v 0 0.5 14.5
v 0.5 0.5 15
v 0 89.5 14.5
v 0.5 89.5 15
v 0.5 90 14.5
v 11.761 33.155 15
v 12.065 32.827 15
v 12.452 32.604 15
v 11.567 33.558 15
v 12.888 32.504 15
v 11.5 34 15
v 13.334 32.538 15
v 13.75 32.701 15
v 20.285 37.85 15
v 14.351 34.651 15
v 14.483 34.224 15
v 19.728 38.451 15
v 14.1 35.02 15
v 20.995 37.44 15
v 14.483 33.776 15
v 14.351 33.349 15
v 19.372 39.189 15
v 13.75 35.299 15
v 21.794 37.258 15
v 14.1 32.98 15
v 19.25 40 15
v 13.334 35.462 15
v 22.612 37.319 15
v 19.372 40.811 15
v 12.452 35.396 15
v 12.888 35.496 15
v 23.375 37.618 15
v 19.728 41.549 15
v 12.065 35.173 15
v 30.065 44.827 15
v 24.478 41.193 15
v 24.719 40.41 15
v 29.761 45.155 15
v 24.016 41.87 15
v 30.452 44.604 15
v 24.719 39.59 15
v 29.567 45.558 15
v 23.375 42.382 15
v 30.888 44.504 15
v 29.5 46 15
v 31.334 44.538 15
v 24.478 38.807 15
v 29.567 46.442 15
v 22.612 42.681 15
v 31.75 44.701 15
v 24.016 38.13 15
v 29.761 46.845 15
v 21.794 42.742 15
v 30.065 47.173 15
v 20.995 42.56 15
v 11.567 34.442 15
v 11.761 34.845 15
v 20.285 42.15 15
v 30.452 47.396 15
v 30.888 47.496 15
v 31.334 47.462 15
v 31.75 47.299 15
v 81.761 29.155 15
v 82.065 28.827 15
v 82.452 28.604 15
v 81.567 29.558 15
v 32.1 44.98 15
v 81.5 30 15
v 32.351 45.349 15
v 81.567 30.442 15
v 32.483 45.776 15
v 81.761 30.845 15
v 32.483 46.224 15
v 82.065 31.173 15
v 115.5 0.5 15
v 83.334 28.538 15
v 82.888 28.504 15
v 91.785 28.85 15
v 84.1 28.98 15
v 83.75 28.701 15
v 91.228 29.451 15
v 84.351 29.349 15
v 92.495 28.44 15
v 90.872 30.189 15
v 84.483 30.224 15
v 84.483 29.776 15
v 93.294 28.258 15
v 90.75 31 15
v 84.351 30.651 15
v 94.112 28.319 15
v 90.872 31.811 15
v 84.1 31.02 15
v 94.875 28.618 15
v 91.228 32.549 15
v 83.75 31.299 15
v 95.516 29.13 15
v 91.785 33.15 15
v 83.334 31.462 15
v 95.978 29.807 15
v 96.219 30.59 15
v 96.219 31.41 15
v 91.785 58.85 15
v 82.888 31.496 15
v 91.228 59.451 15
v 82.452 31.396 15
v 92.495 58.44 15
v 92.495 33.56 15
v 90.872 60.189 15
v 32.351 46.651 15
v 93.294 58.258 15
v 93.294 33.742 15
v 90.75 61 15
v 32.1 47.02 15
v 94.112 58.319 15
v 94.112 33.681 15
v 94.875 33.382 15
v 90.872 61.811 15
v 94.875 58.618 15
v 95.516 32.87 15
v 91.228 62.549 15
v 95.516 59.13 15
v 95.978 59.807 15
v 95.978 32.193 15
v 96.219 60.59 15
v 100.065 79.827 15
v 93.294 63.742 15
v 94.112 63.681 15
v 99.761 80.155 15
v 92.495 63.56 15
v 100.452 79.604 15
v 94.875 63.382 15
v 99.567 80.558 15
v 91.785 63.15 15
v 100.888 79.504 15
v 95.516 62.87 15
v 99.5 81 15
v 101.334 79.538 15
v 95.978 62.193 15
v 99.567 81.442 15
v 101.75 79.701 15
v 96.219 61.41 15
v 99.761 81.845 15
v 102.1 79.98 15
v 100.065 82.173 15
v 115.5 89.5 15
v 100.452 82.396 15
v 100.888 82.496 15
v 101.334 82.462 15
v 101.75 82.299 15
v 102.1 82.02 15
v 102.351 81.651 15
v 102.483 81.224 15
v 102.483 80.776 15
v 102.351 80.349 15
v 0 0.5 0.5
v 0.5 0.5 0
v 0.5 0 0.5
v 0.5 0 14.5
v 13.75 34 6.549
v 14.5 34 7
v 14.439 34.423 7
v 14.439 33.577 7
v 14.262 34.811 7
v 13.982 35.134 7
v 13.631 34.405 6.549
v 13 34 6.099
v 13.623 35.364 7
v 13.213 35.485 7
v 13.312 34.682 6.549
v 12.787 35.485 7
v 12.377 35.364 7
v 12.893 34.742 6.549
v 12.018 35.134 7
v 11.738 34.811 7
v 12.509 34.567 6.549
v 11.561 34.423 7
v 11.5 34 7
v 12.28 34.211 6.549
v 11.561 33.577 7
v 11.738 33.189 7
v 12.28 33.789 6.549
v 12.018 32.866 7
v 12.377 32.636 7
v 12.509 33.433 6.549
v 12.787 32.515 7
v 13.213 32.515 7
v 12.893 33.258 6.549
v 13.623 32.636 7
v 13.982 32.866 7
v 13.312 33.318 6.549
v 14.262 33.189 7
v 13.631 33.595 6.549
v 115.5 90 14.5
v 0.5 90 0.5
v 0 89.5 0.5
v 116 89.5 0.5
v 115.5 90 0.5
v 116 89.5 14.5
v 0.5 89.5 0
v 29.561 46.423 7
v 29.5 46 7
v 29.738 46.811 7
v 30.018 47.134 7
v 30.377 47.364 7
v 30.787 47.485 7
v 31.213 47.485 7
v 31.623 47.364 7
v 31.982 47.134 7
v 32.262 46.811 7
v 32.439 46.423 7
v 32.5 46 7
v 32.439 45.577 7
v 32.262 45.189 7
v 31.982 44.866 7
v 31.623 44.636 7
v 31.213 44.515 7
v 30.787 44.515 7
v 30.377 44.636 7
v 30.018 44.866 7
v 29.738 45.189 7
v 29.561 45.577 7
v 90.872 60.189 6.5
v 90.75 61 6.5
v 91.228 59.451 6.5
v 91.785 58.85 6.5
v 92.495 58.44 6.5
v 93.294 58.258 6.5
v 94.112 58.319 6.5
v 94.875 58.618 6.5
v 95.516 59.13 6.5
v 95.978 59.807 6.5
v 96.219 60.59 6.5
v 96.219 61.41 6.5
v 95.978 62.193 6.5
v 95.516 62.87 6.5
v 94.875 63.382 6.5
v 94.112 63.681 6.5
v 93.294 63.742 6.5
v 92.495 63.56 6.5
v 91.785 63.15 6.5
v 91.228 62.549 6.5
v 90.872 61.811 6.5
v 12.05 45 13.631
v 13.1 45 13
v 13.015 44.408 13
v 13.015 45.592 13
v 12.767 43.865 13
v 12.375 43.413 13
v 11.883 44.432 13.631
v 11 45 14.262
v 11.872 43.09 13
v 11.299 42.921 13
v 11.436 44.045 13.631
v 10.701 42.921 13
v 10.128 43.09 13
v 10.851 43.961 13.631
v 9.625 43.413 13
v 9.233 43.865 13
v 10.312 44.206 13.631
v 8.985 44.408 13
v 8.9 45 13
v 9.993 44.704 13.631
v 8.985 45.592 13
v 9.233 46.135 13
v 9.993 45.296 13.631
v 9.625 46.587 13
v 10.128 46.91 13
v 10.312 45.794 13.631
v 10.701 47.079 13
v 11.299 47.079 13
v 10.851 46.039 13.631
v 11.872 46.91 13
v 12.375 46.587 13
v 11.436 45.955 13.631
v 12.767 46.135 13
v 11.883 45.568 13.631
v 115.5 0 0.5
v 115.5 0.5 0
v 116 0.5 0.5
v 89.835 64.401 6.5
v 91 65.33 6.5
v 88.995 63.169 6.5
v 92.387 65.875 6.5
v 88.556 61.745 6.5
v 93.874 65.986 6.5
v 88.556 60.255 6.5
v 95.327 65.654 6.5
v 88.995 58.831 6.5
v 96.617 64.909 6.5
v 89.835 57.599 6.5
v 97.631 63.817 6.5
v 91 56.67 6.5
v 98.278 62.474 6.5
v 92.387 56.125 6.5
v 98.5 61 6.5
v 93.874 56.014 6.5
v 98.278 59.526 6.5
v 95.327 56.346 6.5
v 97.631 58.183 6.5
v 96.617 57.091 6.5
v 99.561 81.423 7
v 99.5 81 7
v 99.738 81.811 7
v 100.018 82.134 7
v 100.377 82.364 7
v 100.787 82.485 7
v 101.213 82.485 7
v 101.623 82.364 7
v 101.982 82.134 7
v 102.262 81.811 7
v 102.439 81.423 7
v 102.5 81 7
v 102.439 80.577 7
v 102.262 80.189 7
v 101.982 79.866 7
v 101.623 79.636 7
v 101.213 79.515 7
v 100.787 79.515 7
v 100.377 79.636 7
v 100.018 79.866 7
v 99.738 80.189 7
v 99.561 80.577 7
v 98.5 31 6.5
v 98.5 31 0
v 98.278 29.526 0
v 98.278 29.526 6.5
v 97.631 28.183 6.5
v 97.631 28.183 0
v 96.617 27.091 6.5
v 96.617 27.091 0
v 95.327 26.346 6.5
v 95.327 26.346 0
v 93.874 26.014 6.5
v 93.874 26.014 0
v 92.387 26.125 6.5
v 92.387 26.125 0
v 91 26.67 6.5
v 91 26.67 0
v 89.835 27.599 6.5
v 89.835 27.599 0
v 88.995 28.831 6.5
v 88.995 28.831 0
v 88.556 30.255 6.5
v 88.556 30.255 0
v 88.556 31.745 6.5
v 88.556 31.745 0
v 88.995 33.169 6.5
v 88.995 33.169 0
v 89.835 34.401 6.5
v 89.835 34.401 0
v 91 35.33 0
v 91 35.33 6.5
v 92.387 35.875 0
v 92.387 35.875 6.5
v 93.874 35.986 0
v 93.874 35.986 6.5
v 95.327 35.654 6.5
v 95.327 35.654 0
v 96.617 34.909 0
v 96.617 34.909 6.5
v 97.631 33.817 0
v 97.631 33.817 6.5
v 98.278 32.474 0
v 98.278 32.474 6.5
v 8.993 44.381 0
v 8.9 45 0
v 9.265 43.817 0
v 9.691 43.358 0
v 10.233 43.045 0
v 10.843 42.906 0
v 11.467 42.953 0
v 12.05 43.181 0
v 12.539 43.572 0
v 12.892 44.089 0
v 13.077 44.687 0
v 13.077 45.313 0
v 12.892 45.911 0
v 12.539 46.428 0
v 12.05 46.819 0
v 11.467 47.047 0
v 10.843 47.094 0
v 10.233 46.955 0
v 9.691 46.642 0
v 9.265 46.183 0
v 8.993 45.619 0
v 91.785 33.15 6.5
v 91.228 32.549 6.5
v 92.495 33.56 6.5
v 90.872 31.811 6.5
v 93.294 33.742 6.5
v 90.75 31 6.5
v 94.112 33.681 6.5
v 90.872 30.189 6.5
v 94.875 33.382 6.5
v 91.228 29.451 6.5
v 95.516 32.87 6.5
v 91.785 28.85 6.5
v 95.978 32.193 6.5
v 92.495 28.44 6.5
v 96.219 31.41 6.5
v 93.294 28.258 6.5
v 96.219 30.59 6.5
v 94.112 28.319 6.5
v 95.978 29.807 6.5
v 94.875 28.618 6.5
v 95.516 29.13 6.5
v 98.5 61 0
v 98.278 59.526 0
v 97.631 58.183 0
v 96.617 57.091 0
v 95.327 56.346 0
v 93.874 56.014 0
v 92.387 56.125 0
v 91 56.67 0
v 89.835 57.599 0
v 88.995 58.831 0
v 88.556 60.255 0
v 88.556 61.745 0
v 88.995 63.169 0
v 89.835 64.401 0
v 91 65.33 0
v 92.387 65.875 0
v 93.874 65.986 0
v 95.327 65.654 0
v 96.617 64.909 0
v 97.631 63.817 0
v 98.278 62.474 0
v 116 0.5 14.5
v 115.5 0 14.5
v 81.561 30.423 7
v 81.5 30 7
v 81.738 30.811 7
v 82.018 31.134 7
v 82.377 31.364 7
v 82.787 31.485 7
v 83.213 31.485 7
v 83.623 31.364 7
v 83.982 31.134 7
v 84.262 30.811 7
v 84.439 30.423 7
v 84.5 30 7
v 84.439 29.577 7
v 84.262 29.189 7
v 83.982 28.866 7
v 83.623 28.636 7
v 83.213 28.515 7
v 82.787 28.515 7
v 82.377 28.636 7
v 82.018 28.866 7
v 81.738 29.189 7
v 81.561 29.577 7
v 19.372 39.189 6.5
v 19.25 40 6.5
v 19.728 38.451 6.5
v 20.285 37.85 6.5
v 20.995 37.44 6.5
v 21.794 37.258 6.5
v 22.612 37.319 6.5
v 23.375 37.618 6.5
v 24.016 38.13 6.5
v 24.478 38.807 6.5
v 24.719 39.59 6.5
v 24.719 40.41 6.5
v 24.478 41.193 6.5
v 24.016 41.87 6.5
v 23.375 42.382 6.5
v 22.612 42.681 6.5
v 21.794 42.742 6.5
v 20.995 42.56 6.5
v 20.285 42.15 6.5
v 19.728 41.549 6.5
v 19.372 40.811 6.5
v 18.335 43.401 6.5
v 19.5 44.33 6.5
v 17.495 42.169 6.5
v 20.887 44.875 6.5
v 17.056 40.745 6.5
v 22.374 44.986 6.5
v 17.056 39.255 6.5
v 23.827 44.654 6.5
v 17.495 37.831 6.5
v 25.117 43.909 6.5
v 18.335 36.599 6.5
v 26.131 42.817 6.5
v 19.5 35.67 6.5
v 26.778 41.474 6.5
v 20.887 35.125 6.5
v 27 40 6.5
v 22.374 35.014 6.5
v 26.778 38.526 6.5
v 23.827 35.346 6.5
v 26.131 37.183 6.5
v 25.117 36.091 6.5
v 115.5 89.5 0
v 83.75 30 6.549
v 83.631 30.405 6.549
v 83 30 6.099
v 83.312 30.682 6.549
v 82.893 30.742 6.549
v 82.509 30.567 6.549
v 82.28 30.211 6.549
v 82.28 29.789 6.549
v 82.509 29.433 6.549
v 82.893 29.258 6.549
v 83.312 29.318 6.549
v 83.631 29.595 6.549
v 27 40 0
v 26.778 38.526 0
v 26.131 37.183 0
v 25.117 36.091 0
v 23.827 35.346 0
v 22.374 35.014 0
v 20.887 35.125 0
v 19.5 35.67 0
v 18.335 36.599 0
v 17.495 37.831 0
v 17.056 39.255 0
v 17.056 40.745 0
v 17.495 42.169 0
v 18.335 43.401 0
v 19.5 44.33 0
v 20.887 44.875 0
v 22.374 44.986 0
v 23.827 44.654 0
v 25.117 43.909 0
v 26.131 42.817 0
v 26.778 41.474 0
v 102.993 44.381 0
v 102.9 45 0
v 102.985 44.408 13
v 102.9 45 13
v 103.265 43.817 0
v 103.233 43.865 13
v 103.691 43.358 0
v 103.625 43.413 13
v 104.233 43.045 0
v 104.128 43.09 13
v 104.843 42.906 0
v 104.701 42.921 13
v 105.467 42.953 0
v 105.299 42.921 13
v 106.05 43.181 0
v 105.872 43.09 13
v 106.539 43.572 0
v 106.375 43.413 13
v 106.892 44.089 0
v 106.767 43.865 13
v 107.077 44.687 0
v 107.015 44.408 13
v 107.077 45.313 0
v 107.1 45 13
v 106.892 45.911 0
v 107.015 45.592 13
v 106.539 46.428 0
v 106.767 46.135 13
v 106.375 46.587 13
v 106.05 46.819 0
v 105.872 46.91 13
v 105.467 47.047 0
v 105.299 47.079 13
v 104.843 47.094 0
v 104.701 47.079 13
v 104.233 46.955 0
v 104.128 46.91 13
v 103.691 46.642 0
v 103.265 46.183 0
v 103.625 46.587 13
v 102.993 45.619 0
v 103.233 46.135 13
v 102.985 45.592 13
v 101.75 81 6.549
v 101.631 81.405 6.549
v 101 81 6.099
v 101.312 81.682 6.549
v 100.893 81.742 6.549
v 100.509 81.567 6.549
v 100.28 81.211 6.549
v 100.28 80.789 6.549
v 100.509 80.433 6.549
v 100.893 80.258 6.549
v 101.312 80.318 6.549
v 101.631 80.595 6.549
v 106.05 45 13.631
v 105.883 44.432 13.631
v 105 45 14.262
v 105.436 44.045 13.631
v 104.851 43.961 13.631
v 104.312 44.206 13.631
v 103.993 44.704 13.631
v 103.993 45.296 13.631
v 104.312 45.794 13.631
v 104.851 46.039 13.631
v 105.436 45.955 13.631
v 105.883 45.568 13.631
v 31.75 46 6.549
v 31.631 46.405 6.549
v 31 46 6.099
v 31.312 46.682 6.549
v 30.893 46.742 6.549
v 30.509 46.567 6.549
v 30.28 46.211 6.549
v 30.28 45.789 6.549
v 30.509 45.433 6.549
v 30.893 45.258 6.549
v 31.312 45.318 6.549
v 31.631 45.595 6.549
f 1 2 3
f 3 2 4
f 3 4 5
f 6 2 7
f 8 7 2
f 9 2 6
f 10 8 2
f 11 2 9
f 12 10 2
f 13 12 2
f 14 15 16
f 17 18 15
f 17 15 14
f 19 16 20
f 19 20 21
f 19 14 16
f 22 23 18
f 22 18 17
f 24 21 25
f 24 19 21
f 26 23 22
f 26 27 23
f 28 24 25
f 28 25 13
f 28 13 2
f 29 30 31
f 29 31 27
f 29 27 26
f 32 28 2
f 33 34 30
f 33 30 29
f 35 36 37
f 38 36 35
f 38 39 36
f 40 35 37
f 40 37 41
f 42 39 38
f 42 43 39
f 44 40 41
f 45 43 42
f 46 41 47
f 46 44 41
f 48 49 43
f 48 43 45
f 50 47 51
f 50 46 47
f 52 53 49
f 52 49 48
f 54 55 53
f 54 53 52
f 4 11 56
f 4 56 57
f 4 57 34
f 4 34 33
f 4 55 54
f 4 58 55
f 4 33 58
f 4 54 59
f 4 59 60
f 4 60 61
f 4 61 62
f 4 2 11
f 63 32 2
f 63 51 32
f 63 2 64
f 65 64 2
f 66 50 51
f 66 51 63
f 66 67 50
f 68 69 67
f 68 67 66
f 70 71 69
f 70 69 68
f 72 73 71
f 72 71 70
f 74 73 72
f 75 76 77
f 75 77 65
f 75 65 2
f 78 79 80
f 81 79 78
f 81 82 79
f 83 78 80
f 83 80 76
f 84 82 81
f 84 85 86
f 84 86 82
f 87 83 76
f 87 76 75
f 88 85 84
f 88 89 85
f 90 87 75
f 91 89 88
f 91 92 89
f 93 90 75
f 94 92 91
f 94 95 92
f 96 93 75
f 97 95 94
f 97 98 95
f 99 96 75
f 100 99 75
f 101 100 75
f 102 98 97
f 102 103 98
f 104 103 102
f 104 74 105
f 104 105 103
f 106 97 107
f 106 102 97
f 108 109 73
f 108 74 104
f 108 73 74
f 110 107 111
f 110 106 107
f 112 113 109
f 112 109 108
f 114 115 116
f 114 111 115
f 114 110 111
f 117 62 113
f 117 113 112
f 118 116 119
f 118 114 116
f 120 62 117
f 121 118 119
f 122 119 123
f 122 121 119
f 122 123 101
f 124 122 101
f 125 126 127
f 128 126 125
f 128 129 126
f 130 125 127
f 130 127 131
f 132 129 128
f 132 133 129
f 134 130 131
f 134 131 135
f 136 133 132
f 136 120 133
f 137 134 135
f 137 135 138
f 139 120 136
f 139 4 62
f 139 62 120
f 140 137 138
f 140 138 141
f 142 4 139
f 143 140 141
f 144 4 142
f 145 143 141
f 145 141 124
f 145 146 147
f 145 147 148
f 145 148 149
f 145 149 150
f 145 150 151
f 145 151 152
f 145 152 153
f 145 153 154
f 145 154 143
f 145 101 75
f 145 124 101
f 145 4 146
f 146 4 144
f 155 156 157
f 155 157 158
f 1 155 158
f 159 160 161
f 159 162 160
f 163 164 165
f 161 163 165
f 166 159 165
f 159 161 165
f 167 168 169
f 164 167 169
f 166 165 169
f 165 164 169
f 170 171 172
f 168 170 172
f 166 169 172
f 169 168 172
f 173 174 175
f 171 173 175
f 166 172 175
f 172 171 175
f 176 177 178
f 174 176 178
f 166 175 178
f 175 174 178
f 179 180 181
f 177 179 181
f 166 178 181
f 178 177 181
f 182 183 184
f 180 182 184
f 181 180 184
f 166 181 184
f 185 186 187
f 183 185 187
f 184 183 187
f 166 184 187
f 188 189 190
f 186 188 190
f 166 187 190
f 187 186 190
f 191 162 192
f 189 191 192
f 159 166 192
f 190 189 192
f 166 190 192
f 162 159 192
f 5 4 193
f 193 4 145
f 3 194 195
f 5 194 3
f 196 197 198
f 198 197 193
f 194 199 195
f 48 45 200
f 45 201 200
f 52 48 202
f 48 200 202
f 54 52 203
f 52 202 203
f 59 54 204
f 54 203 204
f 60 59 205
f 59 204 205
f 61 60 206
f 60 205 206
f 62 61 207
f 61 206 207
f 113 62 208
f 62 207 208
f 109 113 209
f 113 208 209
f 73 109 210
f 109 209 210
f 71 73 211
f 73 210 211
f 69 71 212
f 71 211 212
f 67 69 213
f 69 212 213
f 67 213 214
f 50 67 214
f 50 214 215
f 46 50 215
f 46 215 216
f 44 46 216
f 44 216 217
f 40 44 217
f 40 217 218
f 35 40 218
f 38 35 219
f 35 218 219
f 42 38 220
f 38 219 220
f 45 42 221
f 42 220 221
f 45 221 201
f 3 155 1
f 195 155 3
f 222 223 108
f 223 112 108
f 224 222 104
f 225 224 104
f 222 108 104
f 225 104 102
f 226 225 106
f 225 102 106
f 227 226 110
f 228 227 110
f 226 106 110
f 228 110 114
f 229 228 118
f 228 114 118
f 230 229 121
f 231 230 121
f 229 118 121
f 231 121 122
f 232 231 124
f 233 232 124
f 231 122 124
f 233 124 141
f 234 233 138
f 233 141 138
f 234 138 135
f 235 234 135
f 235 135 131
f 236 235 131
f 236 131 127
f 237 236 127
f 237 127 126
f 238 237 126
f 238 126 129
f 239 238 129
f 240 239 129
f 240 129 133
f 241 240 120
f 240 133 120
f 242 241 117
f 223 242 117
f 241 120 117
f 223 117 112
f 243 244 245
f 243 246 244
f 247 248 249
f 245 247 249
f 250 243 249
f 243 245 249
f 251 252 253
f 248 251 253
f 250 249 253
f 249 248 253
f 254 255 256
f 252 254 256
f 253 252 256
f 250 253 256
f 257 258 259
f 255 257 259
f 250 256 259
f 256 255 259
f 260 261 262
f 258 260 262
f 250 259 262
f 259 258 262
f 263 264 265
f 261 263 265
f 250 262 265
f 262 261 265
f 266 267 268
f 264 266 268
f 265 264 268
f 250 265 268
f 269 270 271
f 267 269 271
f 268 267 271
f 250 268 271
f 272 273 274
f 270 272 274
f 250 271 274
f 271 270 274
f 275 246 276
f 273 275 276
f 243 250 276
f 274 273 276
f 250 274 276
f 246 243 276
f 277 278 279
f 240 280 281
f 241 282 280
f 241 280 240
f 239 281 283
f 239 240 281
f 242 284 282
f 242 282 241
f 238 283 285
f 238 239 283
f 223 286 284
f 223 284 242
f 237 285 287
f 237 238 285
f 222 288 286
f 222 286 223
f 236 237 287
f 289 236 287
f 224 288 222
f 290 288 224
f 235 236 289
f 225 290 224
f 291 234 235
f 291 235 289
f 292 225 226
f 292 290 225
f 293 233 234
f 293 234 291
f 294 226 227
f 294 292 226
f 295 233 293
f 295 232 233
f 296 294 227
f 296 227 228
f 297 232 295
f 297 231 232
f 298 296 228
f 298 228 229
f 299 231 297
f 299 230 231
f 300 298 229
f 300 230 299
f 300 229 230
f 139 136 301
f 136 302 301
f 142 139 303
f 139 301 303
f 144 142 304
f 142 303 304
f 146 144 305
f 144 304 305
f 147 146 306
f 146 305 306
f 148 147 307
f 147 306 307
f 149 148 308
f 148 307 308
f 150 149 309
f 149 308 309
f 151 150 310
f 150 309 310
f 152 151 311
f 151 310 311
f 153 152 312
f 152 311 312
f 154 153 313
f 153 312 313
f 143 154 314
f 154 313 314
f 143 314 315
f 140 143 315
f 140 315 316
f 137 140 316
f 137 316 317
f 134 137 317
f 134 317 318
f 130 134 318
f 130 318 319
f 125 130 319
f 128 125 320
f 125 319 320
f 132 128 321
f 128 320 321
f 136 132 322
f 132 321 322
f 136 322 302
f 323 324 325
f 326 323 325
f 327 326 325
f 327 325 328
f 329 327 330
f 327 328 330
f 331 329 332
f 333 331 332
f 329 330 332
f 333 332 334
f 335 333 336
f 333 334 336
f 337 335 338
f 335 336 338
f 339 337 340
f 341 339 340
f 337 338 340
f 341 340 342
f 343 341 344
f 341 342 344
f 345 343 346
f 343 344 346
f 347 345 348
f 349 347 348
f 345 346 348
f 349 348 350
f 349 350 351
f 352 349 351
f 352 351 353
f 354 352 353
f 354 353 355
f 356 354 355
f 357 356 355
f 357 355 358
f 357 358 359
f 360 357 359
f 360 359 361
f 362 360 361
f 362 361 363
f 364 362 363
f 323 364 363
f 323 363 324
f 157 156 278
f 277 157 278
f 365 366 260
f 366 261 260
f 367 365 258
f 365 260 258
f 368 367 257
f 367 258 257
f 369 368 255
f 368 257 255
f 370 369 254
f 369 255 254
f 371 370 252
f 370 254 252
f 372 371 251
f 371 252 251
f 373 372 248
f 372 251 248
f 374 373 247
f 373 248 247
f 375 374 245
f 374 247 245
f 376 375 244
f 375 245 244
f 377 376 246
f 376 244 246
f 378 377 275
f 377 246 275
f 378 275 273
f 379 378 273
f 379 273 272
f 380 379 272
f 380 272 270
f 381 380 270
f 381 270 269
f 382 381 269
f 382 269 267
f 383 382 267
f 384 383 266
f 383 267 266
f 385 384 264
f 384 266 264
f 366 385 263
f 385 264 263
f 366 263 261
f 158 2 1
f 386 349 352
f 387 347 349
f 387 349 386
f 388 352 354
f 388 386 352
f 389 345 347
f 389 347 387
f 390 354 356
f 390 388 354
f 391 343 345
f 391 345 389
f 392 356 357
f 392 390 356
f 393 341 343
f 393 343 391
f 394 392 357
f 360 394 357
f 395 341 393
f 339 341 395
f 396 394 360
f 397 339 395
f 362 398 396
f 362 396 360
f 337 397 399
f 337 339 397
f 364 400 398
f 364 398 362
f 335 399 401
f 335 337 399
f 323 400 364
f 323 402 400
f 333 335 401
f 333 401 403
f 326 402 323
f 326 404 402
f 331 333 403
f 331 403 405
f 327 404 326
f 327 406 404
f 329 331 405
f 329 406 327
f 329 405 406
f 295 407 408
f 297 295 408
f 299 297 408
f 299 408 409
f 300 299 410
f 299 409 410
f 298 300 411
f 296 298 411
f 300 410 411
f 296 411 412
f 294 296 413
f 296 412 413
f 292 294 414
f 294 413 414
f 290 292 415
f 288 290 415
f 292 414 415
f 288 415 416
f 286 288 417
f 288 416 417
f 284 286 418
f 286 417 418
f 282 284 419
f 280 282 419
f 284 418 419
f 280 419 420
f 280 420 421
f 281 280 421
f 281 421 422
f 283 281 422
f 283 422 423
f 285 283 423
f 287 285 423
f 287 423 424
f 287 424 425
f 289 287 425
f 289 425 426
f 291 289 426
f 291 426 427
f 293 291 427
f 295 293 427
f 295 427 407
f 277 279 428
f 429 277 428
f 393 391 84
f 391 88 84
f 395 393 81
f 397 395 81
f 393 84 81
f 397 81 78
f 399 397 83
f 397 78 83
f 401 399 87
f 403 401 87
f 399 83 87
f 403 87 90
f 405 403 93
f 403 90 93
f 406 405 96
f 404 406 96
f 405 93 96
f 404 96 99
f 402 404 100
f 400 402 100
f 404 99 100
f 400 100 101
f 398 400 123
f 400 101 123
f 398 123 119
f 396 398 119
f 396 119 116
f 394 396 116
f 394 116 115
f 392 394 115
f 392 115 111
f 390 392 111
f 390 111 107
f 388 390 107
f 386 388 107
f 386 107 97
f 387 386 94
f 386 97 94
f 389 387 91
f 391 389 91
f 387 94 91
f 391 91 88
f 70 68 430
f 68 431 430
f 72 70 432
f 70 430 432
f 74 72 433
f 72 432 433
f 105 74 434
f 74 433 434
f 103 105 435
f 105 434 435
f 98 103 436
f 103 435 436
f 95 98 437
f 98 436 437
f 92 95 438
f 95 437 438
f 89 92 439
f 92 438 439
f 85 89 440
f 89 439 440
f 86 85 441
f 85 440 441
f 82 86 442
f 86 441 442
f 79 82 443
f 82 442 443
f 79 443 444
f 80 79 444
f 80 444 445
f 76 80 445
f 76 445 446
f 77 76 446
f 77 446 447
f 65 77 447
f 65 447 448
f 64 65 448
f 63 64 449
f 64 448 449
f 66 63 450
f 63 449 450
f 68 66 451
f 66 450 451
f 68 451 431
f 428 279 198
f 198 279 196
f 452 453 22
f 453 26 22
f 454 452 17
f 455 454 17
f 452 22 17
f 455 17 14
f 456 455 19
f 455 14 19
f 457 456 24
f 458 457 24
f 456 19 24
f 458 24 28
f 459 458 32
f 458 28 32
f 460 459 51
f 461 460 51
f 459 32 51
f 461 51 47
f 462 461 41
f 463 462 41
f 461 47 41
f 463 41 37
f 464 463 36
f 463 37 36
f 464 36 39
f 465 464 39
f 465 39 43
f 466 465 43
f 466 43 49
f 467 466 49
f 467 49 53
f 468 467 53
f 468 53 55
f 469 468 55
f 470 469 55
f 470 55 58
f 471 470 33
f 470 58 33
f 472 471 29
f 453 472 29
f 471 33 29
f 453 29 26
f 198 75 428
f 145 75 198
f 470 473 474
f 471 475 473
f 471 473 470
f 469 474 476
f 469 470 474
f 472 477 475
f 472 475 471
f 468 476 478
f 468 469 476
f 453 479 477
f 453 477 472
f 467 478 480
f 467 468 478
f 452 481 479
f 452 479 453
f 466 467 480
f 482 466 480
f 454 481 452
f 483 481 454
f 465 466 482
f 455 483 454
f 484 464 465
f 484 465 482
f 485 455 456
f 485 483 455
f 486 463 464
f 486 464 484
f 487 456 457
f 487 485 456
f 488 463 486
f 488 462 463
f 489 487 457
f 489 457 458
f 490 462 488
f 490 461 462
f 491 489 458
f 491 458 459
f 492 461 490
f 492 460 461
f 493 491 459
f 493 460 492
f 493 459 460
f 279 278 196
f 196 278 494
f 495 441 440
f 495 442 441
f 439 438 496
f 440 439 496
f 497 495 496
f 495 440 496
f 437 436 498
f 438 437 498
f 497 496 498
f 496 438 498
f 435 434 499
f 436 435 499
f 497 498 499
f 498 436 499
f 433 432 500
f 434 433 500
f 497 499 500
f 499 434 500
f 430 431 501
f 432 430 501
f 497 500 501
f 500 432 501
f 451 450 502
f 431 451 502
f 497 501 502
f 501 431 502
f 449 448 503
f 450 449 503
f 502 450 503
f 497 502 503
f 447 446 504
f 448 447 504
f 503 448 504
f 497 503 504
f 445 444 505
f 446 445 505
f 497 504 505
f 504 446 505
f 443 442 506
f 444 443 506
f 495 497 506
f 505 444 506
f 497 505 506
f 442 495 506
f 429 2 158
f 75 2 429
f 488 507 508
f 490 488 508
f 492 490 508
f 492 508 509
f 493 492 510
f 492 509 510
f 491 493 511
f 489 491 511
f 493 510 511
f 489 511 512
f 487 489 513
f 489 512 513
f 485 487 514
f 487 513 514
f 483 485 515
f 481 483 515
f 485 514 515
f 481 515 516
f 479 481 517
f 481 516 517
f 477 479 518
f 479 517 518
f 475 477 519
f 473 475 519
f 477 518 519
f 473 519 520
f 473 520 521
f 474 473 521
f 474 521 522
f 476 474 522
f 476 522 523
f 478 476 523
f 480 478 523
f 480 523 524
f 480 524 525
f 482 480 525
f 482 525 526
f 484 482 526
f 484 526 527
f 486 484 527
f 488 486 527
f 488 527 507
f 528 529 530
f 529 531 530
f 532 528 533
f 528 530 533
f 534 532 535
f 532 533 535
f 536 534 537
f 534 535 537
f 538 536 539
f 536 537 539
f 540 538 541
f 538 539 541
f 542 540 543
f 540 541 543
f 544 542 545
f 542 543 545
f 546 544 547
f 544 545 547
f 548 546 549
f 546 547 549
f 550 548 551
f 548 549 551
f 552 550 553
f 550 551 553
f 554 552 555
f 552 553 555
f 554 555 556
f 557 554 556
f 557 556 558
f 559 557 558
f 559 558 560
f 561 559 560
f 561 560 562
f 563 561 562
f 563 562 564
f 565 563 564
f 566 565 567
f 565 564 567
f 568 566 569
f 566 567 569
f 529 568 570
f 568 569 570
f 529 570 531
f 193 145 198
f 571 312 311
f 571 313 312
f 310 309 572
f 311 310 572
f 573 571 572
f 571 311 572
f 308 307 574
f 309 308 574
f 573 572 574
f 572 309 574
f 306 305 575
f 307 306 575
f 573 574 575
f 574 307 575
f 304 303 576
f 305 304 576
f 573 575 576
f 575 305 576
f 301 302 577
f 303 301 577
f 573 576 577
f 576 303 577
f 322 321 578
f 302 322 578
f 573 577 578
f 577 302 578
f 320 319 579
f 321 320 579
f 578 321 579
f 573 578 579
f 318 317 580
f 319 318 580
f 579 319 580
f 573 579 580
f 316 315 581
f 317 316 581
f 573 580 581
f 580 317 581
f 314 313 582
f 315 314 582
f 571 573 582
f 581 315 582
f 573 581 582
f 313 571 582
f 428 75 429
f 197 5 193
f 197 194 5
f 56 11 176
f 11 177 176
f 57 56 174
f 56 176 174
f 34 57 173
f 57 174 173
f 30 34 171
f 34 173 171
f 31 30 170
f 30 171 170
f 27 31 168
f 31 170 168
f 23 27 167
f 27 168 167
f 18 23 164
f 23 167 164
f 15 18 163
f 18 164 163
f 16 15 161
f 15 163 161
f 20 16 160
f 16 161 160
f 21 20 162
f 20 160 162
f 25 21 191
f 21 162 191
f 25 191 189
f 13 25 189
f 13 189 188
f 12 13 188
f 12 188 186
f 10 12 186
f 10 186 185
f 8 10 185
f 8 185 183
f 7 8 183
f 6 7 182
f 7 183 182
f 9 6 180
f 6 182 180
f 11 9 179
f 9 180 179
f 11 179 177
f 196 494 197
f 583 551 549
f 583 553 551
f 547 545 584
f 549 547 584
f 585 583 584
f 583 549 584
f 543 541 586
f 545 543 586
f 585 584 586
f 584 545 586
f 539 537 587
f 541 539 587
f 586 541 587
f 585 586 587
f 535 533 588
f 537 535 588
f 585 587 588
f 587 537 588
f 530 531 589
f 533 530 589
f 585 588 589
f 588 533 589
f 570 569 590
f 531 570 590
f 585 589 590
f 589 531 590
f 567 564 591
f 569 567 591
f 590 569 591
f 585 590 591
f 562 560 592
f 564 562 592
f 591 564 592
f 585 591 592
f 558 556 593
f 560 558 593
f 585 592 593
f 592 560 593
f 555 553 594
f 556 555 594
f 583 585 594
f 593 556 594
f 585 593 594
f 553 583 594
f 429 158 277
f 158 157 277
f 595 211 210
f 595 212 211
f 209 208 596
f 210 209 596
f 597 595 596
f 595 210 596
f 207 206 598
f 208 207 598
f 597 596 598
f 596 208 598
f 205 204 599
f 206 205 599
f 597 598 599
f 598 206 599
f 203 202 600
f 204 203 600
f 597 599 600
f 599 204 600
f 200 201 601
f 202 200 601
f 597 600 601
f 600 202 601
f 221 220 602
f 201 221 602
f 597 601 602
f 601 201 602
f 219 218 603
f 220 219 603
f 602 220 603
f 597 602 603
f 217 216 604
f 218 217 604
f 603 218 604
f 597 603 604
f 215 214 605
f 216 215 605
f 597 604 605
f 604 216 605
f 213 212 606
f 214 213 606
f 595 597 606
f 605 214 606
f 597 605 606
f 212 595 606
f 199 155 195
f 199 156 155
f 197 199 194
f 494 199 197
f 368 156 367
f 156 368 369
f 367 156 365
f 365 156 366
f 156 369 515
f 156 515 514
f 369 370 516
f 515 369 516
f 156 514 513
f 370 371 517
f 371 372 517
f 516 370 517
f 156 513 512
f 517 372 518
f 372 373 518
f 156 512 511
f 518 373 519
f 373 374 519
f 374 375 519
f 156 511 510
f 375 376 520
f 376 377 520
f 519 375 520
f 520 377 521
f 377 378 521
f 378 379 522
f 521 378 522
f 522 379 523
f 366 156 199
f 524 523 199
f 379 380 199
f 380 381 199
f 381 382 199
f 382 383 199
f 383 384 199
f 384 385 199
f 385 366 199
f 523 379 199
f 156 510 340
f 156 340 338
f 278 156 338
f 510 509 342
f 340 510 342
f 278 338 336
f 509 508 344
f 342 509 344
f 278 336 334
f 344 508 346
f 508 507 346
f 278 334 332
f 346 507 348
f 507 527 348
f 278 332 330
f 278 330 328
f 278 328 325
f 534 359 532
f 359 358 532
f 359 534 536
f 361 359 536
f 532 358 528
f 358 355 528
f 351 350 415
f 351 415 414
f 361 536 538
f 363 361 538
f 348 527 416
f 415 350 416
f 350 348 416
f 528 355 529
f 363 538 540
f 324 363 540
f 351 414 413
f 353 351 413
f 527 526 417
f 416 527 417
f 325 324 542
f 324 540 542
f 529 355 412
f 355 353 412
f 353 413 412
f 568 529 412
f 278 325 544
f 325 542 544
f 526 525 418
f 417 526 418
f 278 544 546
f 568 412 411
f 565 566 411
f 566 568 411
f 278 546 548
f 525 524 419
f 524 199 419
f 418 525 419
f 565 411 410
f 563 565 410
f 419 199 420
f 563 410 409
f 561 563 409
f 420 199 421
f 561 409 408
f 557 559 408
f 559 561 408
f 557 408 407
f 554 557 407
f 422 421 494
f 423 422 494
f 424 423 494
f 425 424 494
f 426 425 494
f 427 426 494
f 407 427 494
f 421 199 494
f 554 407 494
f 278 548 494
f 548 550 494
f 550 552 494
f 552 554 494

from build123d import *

# Parameters (mm, degrees)
F0_W           = 116
F0_H           = 90
F1_DEPTH       = 15
F2_SIZE        = 0.5
F5_D           = 3
F5_DEPTH       = 8
F5_TIP         = 0.9012909285
F6_D           = 4.2
F6_DEPTH       = 13
F6_TIP         = 1.2618073
F7_D           = 5.5
F7_CBORE_D     = 10
F7_CBORE_DEPTH = 6.5


with BuildPart() as f1:
    # F0 (on Top) → F1 (new body)
    with BuildSketch(Plane.XY):
        with Locations((58, 45)):
            Rectangle(F0_W, F0_H)
    extrude(amount=F1_DEPTH)

    # F2
    f2_edges = [f1.edges().sort_by_distance(p)[0] for p in [
        (0, 45, 15),
        (58, 0, 15),
        (116, 45, 15),
        (58, 90, 15),
        (0, 45, 0),
        (58, 0, 0),
        (116, 45, 0),
        (58, 90, 0),
        (0, 0, 7.5),
        (116, 0, 7.5),
        (116, 90, 7.5),
        (0, 90, 7.5),
    ]]
    chamfer(f2_edges, length=F2_SIZE)

    # F5
    with Locations(Plane.XY.offset(15)):
        with Locations((101, 81), (31, 46), (13, 34), (83, 30)):
            Hole(F5_D / 2, depth=F5_DEPTH)
            with Locations((0, 0, -(F5_DEPTH + F5_TIP / 2))):  # 118° drill point
                Cone(0, F5_D / 2, F5_TIP, mode=Mode.SUBTRACT)

    # F6
    with Locations(Plane(origin=(0, 0, 0), x_dir=(1, 0, 0), z_dir=(0, 0, -1))):
        with Locations((105, -45), (11, -45)):
            Hole(F6_D / 2, depth=F6_DEPTH)
            with Locations((0, 0, -(F6_DEPTH + F6_TIP / 2))):  # 118° drill point
                Cone(0, F6_D / 2, F6_TIP, mode=Mode.SUBTRACT)

    # F7 (through all)
    with Locations(Plane(origin=(0, 0, 0), x_dir=(1, 0, 0), z_dir=(0, 0, -1))):
        with Locations((93.5, -61), (93.5, -31), (22, -40)):
            CounterBoreHole(F7_D / 2, F7_CBORE_D / 2, F7_CBORE_DEPTH)


solid = f1.part
